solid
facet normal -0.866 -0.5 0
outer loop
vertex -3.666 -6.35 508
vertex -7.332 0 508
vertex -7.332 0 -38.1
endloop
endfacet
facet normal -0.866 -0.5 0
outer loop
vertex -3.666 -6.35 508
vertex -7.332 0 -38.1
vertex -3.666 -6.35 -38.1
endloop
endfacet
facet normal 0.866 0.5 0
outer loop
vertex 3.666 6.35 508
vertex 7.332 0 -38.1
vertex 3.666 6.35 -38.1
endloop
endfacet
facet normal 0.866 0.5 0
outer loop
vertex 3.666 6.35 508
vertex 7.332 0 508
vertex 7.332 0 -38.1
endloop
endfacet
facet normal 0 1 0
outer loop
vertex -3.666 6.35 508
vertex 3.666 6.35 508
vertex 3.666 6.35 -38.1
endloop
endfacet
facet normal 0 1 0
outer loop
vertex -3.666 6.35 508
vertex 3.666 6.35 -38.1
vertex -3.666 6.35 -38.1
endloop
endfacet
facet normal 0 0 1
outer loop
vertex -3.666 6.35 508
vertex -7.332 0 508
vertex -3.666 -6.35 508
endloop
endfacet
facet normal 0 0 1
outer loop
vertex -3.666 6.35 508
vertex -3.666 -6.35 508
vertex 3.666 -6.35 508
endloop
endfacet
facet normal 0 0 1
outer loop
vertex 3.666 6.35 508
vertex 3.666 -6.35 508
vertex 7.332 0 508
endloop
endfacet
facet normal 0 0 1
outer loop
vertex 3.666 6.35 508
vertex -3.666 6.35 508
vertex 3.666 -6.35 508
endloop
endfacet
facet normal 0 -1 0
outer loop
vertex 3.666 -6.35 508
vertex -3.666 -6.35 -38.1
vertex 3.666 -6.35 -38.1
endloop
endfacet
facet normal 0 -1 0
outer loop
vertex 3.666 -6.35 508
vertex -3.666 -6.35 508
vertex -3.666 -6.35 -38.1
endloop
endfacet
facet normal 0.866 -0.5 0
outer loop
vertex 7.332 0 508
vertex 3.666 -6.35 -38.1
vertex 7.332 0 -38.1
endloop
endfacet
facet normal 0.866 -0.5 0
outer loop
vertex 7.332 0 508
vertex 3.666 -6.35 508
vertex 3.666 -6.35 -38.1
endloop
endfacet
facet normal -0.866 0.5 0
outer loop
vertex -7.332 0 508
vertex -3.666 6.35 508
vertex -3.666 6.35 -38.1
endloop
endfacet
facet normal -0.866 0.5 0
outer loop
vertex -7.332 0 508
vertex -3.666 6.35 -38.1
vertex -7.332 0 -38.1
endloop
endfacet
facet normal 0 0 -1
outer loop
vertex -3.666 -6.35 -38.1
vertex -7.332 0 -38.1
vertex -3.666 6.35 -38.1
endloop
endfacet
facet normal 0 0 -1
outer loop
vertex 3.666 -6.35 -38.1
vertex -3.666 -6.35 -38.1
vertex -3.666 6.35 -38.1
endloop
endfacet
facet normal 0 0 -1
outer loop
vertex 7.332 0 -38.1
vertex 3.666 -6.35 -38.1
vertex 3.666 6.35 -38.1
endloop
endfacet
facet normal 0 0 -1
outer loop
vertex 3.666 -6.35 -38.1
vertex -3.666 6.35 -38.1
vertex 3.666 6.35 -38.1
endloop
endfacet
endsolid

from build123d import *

# Parameters (mm, degrees)
BOSS_EXTRUDE1_DEPTH      = 508
BOSS_EXTRUDE1_DEPTH_BACK = 38.1


with BuildPart() as part:
    # Sketch1 → Boss-Extrude1 (new body, two sides)
    with BuildSketch(Plane.XY) as boss_extrude1_sk:
        Polygon((7.332348419, 0), (3.666174209, 6.35), (-3.666174209, 6.35), (-7.332348419, 0), (-3.666174209, -6.35), (3.666174209, -6.35), align=None)
    extrude(amount=BOSS_EXTRUDE1_DEPTH)
    extrude(boss_extrude1_sk.sketch, amount=-BOSS_EXTRUDE1_DEPTH_BACK)


solid = part.part
